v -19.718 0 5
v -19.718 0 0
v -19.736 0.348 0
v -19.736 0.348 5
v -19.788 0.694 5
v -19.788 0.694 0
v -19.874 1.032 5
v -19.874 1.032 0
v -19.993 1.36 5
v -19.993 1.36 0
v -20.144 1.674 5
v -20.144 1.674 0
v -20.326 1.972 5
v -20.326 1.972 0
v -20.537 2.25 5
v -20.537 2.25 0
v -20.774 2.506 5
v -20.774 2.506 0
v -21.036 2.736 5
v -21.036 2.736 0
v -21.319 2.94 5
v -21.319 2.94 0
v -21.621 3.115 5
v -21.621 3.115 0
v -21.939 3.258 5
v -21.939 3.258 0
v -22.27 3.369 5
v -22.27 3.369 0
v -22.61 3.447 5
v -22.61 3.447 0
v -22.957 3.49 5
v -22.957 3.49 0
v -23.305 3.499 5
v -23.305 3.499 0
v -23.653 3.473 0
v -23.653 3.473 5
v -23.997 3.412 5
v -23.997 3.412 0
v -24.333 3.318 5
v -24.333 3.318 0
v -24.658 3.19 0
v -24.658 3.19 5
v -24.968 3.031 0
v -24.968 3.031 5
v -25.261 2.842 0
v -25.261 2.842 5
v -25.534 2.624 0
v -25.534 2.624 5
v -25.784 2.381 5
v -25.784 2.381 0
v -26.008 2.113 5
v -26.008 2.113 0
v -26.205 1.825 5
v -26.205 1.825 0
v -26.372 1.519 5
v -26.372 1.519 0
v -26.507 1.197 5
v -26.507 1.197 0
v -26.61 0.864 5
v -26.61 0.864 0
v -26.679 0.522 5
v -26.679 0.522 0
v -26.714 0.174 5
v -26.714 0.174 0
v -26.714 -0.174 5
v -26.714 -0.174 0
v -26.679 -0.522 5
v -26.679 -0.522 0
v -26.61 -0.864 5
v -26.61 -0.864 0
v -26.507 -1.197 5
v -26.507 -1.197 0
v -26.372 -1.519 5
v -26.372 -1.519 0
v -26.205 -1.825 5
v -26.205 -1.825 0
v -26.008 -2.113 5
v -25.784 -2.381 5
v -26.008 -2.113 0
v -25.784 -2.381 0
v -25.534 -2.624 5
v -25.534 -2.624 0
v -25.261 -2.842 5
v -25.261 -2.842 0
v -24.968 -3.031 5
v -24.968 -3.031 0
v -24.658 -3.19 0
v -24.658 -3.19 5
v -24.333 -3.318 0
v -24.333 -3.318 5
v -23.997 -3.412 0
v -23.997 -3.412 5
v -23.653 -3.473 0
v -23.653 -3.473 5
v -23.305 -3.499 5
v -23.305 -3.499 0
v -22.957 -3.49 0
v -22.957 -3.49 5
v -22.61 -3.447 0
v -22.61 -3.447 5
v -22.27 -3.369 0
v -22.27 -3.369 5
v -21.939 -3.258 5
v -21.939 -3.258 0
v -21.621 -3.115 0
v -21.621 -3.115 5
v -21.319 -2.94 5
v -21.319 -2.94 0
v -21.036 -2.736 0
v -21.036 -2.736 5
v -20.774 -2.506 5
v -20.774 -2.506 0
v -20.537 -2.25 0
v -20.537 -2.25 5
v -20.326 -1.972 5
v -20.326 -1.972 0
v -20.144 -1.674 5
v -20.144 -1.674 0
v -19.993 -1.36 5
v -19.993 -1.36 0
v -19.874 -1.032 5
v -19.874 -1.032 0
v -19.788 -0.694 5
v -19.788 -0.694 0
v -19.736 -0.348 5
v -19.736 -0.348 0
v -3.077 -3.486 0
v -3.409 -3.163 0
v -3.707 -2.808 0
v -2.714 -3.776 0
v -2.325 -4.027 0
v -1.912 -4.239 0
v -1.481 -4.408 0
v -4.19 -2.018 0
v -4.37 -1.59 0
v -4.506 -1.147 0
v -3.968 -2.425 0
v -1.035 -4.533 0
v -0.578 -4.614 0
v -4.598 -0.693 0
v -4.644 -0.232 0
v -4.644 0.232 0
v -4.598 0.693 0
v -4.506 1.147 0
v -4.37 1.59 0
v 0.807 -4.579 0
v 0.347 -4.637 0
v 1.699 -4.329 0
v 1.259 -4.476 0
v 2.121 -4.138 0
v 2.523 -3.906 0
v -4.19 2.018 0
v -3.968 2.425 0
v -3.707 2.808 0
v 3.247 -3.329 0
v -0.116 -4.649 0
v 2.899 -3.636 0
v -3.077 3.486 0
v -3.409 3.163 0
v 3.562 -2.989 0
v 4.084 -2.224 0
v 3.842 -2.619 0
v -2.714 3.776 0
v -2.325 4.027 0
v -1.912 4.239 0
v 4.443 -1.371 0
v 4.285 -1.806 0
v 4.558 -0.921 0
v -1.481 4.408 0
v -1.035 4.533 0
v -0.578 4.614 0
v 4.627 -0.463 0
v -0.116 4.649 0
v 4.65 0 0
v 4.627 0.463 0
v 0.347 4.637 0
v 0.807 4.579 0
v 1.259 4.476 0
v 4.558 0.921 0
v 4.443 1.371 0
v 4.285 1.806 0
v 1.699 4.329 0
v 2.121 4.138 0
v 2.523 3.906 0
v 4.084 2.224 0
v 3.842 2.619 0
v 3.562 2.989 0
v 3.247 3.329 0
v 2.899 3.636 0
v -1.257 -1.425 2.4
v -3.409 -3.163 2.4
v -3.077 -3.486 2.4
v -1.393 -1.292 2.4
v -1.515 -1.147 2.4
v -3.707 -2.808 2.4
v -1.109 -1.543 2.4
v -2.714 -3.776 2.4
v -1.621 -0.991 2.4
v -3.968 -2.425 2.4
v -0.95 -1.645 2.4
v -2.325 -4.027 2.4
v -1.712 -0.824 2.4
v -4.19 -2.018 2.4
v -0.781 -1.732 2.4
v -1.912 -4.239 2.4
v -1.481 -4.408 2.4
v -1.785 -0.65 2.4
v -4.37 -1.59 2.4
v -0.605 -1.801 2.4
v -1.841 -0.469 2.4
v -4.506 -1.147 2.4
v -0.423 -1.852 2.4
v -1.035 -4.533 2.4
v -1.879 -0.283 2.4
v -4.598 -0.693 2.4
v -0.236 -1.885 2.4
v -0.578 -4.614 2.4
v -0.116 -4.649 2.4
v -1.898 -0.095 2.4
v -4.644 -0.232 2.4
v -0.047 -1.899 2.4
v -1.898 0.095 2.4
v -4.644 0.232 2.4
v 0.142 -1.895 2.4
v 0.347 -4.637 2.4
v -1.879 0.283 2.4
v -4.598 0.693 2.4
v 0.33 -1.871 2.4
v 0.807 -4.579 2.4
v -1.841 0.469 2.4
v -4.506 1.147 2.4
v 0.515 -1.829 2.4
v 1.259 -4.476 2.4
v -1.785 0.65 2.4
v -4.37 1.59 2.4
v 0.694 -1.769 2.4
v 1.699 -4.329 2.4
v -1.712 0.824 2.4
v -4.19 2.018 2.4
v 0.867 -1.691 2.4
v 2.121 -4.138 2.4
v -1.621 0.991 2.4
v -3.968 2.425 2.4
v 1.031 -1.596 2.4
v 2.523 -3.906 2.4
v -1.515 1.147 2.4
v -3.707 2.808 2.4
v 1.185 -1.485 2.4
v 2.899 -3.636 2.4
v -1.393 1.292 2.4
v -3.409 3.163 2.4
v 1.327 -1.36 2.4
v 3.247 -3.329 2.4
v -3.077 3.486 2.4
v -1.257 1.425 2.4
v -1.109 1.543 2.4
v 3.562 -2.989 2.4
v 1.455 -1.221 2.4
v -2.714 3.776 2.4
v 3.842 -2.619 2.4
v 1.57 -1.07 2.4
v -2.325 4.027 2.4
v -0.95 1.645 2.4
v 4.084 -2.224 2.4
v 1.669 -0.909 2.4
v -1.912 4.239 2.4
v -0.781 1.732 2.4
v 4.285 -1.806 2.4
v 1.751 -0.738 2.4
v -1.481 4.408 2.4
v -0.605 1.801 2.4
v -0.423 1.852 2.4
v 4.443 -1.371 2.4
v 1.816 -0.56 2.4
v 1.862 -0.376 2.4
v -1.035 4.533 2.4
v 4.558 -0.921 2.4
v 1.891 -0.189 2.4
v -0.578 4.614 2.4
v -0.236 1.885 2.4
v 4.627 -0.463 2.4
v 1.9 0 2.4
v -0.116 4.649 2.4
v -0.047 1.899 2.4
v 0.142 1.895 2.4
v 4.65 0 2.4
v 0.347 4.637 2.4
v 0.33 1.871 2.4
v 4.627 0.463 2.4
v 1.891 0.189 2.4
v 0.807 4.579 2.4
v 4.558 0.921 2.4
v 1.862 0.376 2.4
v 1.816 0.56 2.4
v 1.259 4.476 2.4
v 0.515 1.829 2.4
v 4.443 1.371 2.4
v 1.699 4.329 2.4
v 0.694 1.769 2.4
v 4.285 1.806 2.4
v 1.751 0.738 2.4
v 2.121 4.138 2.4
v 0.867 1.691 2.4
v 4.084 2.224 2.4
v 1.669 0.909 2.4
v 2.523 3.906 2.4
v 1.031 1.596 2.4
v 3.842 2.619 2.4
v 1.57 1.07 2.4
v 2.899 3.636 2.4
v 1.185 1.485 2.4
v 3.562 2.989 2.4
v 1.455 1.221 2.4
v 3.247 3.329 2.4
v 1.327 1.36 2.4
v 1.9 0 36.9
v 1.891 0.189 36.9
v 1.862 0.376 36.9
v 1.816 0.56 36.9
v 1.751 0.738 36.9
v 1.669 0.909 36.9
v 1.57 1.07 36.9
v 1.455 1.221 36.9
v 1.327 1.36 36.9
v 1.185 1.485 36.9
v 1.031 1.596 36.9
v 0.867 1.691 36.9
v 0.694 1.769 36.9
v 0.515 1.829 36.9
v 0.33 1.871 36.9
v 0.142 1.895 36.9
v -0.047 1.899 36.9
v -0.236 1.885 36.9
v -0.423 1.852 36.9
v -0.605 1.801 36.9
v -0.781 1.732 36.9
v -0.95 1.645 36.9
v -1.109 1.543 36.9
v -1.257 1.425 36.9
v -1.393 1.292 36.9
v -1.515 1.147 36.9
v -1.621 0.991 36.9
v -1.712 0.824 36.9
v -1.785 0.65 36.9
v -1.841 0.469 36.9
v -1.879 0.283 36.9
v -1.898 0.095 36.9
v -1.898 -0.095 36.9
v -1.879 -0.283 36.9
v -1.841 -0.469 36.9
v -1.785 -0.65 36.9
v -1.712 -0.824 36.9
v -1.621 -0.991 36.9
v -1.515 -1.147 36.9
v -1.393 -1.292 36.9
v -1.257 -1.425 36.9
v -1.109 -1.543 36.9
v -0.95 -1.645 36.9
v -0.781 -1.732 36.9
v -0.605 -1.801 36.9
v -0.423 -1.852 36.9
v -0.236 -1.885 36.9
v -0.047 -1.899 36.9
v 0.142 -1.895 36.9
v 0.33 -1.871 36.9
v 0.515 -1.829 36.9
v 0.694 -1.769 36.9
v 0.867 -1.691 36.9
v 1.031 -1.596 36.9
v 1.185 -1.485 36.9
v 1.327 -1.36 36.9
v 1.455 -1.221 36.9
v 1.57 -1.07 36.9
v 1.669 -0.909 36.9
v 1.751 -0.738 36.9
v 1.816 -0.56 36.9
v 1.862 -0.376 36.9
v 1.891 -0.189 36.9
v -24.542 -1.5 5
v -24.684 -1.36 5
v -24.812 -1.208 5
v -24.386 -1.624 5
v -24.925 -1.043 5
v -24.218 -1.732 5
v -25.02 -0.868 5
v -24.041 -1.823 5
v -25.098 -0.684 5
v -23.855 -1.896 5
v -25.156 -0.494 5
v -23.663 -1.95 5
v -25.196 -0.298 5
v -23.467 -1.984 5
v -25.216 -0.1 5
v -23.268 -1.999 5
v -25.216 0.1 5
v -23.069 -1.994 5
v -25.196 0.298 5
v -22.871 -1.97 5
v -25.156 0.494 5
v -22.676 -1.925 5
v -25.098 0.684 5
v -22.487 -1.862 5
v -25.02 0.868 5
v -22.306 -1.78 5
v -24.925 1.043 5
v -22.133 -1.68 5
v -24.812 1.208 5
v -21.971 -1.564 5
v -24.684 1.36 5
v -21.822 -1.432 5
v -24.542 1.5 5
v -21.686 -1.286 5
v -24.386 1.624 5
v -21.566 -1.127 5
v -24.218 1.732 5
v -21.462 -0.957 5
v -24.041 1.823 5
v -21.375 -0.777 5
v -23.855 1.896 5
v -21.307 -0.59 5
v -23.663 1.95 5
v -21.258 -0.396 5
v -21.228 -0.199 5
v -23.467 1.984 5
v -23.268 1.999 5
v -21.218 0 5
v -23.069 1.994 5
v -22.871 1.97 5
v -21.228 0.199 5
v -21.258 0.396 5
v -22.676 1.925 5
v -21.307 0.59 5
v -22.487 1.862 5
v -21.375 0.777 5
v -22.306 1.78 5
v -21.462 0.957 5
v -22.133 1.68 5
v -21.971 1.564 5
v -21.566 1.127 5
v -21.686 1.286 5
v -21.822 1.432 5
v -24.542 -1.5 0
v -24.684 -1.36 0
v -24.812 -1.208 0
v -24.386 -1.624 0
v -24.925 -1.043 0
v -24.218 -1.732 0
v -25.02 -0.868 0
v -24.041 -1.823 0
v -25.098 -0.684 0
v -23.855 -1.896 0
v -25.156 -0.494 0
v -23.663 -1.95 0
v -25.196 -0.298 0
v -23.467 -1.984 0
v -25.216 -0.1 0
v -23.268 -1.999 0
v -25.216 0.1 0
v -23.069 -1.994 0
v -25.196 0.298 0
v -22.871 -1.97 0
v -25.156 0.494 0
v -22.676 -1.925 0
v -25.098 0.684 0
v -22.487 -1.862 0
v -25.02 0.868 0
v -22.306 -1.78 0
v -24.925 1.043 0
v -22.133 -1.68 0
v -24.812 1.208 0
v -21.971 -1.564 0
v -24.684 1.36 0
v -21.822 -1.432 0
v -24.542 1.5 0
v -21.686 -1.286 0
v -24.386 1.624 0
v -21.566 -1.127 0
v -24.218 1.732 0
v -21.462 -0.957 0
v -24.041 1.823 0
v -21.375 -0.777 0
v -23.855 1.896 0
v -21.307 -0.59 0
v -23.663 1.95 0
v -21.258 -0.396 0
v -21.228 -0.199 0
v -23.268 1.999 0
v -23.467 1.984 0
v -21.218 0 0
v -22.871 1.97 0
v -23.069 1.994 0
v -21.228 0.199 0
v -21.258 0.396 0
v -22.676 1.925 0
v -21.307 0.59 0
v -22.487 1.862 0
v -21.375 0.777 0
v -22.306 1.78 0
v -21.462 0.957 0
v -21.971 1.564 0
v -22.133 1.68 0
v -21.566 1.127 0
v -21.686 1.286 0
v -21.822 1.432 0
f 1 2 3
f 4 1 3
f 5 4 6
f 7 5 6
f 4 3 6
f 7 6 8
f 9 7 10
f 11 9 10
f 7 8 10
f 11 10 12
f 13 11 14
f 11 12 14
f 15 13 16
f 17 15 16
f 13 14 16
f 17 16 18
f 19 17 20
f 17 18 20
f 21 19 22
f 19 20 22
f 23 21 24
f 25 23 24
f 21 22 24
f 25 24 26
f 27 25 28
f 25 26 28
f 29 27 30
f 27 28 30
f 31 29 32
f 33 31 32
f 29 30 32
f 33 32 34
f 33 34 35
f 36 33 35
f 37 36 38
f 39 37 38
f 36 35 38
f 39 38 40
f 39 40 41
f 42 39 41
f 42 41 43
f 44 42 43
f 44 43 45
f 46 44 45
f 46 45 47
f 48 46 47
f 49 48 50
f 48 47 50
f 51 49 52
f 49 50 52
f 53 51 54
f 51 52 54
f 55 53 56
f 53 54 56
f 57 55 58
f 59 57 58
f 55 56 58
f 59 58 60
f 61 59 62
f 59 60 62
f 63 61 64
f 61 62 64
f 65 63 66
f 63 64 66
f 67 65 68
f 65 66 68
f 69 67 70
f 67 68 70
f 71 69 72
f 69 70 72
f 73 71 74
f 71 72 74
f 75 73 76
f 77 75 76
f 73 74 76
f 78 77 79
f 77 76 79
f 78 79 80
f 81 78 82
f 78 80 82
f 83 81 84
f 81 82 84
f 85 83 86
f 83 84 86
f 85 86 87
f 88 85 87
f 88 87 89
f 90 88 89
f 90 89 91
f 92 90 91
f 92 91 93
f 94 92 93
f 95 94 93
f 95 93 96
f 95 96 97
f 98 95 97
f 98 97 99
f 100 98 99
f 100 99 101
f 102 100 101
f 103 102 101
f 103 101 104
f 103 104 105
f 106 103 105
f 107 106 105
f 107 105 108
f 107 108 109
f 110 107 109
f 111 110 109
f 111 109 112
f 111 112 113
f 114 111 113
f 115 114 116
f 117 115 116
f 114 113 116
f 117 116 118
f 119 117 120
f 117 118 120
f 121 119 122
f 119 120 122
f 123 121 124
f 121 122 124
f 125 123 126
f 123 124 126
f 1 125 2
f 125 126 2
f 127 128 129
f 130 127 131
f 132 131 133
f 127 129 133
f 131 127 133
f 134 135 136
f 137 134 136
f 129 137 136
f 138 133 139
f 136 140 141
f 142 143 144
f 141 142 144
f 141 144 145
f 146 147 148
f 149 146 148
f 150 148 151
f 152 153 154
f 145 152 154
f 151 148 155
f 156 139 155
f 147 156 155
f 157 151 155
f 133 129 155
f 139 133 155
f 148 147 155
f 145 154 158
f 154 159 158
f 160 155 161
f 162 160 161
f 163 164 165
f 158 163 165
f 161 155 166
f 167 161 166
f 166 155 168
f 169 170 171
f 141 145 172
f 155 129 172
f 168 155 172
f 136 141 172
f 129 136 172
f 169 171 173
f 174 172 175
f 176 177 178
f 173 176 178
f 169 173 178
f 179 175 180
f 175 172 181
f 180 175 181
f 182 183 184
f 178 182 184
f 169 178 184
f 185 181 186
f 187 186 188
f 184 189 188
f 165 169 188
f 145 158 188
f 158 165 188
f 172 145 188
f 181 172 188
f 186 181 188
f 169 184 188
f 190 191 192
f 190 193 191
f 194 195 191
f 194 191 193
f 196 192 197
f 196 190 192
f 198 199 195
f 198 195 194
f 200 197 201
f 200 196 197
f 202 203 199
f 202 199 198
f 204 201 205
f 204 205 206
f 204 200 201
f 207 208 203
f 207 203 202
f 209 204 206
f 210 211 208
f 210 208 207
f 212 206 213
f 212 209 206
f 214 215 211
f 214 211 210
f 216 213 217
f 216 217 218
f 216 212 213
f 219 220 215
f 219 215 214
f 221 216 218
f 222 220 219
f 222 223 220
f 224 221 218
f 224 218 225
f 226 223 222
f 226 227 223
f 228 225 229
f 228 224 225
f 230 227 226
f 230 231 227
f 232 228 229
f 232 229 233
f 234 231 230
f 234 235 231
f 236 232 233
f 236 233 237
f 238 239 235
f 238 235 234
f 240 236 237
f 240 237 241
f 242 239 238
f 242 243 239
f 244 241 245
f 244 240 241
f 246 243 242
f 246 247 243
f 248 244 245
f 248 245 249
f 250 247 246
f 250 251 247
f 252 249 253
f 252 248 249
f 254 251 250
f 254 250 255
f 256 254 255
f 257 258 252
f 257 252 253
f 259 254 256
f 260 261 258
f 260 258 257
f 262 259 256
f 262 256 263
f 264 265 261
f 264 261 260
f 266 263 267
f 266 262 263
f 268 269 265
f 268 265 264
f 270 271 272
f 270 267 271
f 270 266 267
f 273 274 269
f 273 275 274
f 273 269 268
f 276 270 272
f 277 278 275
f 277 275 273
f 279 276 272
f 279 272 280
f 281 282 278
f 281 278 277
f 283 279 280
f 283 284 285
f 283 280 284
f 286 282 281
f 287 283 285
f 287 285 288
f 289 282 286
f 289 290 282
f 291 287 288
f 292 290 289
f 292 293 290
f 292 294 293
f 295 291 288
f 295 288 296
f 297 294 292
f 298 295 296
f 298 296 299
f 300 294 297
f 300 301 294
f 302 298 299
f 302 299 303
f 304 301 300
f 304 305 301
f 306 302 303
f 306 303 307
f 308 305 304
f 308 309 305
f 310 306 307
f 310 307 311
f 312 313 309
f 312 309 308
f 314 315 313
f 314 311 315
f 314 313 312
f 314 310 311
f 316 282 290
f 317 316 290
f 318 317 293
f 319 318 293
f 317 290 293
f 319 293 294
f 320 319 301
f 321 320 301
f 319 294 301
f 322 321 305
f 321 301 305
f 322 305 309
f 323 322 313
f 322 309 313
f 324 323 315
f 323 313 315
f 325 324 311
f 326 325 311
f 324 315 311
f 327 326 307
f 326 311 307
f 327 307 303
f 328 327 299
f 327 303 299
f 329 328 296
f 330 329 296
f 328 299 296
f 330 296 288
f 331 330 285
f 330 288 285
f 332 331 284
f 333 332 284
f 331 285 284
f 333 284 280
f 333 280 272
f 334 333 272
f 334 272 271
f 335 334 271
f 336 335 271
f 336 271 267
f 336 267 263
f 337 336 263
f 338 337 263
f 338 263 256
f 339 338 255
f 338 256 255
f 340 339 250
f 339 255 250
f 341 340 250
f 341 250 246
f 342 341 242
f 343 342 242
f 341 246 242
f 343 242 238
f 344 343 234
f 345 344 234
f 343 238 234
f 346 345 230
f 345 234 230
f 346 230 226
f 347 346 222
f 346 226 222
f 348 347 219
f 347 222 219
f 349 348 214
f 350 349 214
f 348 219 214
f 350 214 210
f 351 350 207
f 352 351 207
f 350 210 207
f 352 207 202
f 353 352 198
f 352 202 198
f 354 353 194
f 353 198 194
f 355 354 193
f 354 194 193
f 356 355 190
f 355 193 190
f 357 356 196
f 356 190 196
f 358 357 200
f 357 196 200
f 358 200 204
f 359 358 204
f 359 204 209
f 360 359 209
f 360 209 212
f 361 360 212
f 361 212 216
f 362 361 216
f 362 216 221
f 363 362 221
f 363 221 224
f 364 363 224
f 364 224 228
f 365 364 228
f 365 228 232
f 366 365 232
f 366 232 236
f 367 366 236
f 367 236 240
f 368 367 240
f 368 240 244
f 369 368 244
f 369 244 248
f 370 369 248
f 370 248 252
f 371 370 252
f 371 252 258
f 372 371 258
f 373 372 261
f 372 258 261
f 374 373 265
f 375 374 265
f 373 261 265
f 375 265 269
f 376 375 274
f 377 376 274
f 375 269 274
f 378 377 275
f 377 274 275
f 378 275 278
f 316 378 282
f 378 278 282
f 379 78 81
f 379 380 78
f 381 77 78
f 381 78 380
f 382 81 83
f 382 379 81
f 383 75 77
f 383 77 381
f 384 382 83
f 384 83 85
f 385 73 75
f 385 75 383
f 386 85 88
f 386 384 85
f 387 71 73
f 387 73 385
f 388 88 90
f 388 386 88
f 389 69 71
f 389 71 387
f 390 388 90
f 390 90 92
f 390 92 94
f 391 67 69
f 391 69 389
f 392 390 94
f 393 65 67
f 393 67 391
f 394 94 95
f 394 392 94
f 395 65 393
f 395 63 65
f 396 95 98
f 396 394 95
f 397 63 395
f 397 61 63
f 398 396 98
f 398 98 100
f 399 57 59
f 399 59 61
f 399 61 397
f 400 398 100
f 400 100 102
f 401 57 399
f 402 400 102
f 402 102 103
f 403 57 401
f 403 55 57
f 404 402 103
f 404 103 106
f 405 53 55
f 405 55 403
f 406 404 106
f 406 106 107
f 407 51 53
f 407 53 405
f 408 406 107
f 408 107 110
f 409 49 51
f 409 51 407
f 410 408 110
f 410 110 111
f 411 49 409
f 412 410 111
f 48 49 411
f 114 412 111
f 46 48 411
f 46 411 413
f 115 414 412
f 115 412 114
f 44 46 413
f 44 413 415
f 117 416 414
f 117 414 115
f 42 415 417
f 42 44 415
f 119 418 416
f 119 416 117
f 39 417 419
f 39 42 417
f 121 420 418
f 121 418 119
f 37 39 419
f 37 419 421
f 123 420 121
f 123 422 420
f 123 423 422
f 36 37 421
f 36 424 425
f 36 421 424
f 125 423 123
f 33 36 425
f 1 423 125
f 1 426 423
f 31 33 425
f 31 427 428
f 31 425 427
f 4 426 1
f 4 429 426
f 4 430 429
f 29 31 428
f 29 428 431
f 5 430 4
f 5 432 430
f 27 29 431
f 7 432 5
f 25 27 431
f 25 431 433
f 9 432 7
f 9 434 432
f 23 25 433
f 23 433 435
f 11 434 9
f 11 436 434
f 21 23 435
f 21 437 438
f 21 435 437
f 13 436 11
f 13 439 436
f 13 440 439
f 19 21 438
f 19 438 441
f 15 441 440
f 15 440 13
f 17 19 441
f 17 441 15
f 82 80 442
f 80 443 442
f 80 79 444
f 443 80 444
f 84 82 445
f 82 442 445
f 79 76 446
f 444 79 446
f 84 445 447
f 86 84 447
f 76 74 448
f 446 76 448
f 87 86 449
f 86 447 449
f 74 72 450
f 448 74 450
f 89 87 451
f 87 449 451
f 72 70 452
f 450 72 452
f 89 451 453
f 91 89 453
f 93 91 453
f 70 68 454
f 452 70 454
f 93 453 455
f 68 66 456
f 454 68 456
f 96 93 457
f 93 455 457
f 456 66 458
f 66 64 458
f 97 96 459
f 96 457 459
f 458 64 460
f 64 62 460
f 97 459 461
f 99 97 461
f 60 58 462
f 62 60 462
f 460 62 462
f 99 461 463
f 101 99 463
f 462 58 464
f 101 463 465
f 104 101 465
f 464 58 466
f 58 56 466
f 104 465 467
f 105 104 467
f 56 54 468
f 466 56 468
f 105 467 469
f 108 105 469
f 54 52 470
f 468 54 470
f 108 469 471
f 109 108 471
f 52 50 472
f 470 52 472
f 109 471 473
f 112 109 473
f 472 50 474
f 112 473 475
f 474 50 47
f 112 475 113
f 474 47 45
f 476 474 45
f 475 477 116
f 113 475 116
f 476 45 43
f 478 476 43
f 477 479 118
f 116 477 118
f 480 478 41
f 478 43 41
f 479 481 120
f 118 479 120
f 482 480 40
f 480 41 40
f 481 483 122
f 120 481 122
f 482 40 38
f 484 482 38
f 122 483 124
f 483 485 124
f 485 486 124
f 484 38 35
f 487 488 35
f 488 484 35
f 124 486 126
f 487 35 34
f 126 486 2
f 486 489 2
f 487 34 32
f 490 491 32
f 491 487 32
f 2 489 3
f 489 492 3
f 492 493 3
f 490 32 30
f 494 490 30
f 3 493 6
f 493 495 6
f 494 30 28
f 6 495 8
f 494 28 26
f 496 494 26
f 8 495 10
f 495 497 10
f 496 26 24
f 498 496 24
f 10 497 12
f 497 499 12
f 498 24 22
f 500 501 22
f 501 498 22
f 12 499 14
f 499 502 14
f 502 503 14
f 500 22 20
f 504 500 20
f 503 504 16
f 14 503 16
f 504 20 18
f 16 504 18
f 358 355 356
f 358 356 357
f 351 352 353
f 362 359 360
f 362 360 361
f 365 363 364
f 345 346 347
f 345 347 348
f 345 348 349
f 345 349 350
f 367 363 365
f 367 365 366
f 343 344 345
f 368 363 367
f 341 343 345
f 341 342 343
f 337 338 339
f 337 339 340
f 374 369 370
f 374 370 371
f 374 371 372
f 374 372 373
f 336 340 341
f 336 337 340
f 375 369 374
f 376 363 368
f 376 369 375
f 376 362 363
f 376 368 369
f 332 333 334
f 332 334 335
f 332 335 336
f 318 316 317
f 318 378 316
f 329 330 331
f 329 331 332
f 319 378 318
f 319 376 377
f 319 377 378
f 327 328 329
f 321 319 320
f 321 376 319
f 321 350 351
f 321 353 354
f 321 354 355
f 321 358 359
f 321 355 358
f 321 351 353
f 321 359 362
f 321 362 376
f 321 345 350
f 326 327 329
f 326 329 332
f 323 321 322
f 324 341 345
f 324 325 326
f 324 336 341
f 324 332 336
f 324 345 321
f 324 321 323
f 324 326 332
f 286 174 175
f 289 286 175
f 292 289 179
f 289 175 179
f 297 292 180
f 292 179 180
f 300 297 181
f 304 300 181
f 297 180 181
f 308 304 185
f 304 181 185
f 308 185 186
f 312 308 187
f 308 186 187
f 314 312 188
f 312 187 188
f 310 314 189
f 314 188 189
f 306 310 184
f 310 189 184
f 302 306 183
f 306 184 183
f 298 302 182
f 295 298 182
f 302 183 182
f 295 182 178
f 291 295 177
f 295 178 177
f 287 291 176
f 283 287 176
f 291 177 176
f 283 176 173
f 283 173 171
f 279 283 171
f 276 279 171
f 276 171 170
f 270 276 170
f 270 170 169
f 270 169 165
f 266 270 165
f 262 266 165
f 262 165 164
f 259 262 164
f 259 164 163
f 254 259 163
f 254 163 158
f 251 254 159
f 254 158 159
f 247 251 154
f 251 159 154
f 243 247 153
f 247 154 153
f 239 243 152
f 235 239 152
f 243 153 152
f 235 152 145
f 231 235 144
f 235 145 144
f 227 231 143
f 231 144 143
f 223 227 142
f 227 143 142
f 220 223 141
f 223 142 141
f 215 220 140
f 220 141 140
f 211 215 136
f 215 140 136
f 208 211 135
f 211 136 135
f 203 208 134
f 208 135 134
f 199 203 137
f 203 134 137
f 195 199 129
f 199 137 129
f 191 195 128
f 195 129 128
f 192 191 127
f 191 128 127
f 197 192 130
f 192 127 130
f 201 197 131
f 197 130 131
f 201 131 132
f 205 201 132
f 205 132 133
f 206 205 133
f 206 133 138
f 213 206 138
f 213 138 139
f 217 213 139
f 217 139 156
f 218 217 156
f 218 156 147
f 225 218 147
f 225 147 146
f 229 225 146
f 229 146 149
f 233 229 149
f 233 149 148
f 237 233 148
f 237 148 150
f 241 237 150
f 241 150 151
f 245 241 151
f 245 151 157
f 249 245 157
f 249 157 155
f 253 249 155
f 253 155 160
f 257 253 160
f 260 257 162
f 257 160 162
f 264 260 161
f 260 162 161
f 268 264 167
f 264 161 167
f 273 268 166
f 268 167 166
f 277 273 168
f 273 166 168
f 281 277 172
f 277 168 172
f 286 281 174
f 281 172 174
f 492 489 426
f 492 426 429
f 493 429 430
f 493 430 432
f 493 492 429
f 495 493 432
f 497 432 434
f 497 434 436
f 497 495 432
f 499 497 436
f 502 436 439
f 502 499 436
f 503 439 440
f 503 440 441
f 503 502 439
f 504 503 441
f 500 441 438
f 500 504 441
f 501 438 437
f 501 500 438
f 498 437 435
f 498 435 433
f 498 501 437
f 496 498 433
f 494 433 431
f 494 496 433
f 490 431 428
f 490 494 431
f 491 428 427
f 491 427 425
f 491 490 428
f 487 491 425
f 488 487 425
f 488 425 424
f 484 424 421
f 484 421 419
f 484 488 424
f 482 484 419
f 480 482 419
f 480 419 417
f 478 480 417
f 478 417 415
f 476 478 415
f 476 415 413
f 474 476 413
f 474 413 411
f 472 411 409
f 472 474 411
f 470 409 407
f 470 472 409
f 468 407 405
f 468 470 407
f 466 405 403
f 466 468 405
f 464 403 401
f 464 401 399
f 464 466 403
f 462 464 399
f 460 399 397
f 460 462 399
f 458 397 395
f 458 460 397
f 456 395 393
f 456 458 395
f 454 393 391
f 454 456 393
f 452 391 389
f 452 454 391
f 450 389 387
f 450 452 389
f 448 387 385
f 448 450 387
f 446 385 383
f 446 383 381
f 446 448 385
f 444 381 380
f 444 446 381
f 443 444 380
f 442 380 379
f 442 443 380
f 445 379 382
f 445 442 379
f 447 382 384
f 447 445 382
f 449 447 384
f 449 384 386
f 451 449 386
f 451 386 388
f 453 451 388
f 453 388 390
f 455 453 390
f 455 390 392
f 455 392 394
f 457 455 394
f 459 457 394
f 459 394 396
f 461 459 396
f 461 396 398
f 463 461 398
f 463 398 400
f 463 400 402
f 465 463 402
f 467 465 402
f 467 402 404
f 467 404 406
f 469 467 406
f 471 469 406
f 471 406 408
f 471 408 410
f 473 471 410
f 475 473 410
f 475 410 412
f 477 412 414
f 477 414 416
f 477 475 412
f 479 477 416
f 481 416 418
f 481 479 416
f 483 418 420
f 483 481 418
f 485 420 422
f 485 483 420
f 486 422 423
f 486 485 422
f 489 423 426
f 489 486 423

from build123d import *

# Parameters (mm, degrees)
F0_R     = 4.65
F0_R_2   = 1.9
F1_DEPTH = 2.4
F2_R     = 1.9
F3_DEPTH = 34.5
F0_R_3   = 3.5
F0_R_4   = 2
F4_DEPTH = 5


with BuildPart() as f1:
    # F0 (on Top) → F1 (new body)
    with BuildSketch(Plane.XY):
        Circle(F0_R)
        Circle(F0_R_2, mode=Mode.SUBTRACT)
        Circle(F0_R_2)
    extrude(amount=F1_DEPTH)

    # F2 (on face) → F3 (join)
    with BuildSketch(Plane.XY.offset(2.4)):
        Circle(F2_R)
    extrude(amount=F3_DEPTH)


with BuildPart() as f4:
    # F0 (on Top) → F4 (new body)
    with BuildSketch(Plane.XY):
        with Locations((-23.2181288302, 0)):
            Circle(F0_R_3)
        with Locations((-23.2181288302, 0)):
            Circle(F0_R_4, mode=Mode.SUBTRACT)
    extrude(amount=F4_DEPTH)


solid = Compound([f1.part, f4.part])
